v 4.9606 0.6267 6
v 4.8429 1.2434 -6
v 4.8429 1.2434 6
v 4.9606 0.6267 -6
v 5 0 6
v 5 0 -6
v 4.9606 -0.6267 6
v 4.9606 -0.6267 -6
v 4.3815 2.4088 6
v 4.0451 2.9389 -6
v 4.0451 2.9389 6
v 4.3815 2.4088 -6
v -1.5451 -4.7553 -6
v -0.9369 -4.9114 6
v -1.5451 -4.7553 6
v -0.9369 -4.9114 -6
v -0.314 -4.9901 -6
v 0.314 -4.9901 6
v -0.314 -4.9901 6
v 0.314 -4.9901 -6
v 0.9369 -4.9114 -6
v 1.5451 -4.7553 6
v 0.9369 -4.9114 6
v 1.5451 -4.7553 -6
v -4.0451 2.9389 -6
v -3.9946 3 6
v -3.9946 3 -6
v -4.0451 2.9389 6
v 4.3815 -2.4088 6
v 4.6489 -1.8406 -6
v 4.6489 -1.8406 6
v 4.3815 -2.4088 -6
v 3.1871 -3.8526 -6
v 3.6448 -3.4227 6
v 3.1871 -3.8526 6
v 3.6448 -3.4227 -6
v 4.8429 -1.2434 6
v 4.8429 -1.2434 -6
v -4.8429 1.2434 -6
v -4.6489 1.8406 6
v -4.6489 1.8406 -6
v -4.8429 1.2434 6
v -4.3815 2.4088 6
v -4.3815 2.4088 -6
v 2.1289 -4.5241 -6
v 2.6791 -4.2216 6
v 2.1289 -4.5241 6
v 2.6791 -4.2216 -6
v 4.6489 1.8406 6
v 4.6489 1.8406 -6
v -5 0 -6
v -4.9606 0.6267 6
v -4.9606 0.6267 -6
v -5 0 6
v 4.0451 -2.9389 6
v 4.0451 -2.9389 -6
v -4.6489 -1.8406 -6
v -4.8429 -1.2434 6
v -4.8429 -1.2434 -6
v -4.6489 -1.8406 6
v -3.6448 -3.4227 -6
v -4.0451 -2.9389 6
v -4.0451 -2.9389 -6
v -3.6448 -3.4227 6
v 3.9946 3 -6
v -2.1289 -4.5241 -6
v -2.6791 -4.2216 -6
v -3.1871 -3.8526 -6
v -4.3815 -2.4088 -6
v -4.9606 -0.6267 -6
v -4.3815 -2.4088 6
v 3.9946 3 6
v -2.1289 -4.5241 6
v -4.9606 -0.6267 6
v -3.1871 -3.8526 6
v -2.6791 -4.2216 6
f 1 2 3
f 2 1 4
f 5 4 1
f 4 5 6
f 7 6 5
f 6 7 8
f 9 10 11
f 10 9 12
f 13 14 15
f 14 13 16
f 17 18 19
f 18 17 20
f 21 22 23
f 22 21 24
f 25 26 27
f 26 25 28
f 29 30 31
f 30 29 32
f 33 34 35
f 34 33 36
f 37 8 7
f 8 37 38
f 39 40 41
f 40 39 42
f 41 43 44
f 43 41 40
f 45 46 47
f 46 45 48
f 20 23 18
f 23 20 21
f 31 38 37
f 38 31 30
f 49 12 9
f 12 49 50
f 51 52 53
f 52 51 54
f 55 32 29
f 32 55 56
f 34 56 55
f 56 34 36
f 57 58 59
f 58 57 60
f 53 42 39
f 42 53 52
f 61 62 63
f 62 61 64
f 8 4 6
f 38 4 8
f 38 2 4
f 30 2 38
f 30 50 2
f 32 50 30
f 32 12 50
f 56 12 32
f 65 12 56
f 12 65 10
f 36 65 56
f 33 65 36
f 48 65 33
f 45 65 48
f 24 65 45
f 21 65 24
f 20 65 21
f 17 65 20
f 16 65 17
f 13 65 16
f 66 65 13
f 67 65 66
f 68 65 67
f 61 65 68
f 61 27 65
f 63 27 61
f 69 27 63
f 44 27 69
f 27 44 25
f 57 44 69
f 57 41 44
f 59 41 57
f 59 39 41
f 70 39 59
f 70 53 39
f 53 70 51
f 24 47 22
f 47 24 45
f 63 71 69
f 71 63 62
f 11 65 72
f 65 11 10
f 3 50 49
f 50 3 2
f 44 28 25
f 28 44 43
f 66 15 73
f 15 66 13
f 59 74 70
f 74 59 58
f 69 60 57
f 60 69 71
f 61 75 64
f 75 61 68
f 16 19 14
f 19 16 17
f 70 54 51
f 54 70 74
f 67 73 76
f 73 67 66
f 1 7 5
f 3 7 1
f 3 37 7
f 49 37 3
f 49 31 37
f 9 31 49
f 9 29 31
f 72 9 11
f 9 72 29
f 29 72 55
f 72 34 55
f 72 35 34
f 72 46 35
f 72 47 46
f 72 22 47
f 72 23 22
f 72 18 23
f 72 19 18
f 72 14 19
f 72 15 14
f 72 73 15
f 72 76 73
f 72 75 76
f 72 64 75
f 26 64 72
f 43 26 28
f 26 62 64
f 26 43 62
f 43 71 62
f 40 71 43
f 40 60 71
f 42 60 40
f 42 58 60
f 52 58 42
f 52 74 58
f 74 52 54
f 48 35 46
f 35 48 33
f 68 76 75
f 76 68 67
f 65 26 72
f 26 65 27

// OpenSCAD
$fn = 50;

difference() {
	union() {
		translate(v = [0, 0, 0]) {
			rotate(a = [0, 0, 0]) {
				difference() {
					union() {
						translate(v = [0, 0, -6.0]) {
							cylinder(h = 12, r = 5);
						}
					}
					union() {
						translate(v = [-5.1, 3, -6.1]) {
							cube(size = [10.2, 2.1, 12.2]);
						}
					}
				}
			}
		}
	}
	union();
}
